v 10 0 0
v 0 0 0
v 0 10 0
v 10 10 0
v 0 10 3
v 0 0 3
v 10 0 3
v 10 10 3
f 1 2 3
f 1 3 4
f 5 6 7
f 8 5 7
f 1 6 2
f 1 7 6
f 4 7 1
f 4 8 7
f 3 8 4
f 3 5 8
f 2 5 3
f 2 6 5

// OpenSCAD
linear_extrude(3) union(){ square(10); translate([5,5]) circle(5, $fn=32); }
